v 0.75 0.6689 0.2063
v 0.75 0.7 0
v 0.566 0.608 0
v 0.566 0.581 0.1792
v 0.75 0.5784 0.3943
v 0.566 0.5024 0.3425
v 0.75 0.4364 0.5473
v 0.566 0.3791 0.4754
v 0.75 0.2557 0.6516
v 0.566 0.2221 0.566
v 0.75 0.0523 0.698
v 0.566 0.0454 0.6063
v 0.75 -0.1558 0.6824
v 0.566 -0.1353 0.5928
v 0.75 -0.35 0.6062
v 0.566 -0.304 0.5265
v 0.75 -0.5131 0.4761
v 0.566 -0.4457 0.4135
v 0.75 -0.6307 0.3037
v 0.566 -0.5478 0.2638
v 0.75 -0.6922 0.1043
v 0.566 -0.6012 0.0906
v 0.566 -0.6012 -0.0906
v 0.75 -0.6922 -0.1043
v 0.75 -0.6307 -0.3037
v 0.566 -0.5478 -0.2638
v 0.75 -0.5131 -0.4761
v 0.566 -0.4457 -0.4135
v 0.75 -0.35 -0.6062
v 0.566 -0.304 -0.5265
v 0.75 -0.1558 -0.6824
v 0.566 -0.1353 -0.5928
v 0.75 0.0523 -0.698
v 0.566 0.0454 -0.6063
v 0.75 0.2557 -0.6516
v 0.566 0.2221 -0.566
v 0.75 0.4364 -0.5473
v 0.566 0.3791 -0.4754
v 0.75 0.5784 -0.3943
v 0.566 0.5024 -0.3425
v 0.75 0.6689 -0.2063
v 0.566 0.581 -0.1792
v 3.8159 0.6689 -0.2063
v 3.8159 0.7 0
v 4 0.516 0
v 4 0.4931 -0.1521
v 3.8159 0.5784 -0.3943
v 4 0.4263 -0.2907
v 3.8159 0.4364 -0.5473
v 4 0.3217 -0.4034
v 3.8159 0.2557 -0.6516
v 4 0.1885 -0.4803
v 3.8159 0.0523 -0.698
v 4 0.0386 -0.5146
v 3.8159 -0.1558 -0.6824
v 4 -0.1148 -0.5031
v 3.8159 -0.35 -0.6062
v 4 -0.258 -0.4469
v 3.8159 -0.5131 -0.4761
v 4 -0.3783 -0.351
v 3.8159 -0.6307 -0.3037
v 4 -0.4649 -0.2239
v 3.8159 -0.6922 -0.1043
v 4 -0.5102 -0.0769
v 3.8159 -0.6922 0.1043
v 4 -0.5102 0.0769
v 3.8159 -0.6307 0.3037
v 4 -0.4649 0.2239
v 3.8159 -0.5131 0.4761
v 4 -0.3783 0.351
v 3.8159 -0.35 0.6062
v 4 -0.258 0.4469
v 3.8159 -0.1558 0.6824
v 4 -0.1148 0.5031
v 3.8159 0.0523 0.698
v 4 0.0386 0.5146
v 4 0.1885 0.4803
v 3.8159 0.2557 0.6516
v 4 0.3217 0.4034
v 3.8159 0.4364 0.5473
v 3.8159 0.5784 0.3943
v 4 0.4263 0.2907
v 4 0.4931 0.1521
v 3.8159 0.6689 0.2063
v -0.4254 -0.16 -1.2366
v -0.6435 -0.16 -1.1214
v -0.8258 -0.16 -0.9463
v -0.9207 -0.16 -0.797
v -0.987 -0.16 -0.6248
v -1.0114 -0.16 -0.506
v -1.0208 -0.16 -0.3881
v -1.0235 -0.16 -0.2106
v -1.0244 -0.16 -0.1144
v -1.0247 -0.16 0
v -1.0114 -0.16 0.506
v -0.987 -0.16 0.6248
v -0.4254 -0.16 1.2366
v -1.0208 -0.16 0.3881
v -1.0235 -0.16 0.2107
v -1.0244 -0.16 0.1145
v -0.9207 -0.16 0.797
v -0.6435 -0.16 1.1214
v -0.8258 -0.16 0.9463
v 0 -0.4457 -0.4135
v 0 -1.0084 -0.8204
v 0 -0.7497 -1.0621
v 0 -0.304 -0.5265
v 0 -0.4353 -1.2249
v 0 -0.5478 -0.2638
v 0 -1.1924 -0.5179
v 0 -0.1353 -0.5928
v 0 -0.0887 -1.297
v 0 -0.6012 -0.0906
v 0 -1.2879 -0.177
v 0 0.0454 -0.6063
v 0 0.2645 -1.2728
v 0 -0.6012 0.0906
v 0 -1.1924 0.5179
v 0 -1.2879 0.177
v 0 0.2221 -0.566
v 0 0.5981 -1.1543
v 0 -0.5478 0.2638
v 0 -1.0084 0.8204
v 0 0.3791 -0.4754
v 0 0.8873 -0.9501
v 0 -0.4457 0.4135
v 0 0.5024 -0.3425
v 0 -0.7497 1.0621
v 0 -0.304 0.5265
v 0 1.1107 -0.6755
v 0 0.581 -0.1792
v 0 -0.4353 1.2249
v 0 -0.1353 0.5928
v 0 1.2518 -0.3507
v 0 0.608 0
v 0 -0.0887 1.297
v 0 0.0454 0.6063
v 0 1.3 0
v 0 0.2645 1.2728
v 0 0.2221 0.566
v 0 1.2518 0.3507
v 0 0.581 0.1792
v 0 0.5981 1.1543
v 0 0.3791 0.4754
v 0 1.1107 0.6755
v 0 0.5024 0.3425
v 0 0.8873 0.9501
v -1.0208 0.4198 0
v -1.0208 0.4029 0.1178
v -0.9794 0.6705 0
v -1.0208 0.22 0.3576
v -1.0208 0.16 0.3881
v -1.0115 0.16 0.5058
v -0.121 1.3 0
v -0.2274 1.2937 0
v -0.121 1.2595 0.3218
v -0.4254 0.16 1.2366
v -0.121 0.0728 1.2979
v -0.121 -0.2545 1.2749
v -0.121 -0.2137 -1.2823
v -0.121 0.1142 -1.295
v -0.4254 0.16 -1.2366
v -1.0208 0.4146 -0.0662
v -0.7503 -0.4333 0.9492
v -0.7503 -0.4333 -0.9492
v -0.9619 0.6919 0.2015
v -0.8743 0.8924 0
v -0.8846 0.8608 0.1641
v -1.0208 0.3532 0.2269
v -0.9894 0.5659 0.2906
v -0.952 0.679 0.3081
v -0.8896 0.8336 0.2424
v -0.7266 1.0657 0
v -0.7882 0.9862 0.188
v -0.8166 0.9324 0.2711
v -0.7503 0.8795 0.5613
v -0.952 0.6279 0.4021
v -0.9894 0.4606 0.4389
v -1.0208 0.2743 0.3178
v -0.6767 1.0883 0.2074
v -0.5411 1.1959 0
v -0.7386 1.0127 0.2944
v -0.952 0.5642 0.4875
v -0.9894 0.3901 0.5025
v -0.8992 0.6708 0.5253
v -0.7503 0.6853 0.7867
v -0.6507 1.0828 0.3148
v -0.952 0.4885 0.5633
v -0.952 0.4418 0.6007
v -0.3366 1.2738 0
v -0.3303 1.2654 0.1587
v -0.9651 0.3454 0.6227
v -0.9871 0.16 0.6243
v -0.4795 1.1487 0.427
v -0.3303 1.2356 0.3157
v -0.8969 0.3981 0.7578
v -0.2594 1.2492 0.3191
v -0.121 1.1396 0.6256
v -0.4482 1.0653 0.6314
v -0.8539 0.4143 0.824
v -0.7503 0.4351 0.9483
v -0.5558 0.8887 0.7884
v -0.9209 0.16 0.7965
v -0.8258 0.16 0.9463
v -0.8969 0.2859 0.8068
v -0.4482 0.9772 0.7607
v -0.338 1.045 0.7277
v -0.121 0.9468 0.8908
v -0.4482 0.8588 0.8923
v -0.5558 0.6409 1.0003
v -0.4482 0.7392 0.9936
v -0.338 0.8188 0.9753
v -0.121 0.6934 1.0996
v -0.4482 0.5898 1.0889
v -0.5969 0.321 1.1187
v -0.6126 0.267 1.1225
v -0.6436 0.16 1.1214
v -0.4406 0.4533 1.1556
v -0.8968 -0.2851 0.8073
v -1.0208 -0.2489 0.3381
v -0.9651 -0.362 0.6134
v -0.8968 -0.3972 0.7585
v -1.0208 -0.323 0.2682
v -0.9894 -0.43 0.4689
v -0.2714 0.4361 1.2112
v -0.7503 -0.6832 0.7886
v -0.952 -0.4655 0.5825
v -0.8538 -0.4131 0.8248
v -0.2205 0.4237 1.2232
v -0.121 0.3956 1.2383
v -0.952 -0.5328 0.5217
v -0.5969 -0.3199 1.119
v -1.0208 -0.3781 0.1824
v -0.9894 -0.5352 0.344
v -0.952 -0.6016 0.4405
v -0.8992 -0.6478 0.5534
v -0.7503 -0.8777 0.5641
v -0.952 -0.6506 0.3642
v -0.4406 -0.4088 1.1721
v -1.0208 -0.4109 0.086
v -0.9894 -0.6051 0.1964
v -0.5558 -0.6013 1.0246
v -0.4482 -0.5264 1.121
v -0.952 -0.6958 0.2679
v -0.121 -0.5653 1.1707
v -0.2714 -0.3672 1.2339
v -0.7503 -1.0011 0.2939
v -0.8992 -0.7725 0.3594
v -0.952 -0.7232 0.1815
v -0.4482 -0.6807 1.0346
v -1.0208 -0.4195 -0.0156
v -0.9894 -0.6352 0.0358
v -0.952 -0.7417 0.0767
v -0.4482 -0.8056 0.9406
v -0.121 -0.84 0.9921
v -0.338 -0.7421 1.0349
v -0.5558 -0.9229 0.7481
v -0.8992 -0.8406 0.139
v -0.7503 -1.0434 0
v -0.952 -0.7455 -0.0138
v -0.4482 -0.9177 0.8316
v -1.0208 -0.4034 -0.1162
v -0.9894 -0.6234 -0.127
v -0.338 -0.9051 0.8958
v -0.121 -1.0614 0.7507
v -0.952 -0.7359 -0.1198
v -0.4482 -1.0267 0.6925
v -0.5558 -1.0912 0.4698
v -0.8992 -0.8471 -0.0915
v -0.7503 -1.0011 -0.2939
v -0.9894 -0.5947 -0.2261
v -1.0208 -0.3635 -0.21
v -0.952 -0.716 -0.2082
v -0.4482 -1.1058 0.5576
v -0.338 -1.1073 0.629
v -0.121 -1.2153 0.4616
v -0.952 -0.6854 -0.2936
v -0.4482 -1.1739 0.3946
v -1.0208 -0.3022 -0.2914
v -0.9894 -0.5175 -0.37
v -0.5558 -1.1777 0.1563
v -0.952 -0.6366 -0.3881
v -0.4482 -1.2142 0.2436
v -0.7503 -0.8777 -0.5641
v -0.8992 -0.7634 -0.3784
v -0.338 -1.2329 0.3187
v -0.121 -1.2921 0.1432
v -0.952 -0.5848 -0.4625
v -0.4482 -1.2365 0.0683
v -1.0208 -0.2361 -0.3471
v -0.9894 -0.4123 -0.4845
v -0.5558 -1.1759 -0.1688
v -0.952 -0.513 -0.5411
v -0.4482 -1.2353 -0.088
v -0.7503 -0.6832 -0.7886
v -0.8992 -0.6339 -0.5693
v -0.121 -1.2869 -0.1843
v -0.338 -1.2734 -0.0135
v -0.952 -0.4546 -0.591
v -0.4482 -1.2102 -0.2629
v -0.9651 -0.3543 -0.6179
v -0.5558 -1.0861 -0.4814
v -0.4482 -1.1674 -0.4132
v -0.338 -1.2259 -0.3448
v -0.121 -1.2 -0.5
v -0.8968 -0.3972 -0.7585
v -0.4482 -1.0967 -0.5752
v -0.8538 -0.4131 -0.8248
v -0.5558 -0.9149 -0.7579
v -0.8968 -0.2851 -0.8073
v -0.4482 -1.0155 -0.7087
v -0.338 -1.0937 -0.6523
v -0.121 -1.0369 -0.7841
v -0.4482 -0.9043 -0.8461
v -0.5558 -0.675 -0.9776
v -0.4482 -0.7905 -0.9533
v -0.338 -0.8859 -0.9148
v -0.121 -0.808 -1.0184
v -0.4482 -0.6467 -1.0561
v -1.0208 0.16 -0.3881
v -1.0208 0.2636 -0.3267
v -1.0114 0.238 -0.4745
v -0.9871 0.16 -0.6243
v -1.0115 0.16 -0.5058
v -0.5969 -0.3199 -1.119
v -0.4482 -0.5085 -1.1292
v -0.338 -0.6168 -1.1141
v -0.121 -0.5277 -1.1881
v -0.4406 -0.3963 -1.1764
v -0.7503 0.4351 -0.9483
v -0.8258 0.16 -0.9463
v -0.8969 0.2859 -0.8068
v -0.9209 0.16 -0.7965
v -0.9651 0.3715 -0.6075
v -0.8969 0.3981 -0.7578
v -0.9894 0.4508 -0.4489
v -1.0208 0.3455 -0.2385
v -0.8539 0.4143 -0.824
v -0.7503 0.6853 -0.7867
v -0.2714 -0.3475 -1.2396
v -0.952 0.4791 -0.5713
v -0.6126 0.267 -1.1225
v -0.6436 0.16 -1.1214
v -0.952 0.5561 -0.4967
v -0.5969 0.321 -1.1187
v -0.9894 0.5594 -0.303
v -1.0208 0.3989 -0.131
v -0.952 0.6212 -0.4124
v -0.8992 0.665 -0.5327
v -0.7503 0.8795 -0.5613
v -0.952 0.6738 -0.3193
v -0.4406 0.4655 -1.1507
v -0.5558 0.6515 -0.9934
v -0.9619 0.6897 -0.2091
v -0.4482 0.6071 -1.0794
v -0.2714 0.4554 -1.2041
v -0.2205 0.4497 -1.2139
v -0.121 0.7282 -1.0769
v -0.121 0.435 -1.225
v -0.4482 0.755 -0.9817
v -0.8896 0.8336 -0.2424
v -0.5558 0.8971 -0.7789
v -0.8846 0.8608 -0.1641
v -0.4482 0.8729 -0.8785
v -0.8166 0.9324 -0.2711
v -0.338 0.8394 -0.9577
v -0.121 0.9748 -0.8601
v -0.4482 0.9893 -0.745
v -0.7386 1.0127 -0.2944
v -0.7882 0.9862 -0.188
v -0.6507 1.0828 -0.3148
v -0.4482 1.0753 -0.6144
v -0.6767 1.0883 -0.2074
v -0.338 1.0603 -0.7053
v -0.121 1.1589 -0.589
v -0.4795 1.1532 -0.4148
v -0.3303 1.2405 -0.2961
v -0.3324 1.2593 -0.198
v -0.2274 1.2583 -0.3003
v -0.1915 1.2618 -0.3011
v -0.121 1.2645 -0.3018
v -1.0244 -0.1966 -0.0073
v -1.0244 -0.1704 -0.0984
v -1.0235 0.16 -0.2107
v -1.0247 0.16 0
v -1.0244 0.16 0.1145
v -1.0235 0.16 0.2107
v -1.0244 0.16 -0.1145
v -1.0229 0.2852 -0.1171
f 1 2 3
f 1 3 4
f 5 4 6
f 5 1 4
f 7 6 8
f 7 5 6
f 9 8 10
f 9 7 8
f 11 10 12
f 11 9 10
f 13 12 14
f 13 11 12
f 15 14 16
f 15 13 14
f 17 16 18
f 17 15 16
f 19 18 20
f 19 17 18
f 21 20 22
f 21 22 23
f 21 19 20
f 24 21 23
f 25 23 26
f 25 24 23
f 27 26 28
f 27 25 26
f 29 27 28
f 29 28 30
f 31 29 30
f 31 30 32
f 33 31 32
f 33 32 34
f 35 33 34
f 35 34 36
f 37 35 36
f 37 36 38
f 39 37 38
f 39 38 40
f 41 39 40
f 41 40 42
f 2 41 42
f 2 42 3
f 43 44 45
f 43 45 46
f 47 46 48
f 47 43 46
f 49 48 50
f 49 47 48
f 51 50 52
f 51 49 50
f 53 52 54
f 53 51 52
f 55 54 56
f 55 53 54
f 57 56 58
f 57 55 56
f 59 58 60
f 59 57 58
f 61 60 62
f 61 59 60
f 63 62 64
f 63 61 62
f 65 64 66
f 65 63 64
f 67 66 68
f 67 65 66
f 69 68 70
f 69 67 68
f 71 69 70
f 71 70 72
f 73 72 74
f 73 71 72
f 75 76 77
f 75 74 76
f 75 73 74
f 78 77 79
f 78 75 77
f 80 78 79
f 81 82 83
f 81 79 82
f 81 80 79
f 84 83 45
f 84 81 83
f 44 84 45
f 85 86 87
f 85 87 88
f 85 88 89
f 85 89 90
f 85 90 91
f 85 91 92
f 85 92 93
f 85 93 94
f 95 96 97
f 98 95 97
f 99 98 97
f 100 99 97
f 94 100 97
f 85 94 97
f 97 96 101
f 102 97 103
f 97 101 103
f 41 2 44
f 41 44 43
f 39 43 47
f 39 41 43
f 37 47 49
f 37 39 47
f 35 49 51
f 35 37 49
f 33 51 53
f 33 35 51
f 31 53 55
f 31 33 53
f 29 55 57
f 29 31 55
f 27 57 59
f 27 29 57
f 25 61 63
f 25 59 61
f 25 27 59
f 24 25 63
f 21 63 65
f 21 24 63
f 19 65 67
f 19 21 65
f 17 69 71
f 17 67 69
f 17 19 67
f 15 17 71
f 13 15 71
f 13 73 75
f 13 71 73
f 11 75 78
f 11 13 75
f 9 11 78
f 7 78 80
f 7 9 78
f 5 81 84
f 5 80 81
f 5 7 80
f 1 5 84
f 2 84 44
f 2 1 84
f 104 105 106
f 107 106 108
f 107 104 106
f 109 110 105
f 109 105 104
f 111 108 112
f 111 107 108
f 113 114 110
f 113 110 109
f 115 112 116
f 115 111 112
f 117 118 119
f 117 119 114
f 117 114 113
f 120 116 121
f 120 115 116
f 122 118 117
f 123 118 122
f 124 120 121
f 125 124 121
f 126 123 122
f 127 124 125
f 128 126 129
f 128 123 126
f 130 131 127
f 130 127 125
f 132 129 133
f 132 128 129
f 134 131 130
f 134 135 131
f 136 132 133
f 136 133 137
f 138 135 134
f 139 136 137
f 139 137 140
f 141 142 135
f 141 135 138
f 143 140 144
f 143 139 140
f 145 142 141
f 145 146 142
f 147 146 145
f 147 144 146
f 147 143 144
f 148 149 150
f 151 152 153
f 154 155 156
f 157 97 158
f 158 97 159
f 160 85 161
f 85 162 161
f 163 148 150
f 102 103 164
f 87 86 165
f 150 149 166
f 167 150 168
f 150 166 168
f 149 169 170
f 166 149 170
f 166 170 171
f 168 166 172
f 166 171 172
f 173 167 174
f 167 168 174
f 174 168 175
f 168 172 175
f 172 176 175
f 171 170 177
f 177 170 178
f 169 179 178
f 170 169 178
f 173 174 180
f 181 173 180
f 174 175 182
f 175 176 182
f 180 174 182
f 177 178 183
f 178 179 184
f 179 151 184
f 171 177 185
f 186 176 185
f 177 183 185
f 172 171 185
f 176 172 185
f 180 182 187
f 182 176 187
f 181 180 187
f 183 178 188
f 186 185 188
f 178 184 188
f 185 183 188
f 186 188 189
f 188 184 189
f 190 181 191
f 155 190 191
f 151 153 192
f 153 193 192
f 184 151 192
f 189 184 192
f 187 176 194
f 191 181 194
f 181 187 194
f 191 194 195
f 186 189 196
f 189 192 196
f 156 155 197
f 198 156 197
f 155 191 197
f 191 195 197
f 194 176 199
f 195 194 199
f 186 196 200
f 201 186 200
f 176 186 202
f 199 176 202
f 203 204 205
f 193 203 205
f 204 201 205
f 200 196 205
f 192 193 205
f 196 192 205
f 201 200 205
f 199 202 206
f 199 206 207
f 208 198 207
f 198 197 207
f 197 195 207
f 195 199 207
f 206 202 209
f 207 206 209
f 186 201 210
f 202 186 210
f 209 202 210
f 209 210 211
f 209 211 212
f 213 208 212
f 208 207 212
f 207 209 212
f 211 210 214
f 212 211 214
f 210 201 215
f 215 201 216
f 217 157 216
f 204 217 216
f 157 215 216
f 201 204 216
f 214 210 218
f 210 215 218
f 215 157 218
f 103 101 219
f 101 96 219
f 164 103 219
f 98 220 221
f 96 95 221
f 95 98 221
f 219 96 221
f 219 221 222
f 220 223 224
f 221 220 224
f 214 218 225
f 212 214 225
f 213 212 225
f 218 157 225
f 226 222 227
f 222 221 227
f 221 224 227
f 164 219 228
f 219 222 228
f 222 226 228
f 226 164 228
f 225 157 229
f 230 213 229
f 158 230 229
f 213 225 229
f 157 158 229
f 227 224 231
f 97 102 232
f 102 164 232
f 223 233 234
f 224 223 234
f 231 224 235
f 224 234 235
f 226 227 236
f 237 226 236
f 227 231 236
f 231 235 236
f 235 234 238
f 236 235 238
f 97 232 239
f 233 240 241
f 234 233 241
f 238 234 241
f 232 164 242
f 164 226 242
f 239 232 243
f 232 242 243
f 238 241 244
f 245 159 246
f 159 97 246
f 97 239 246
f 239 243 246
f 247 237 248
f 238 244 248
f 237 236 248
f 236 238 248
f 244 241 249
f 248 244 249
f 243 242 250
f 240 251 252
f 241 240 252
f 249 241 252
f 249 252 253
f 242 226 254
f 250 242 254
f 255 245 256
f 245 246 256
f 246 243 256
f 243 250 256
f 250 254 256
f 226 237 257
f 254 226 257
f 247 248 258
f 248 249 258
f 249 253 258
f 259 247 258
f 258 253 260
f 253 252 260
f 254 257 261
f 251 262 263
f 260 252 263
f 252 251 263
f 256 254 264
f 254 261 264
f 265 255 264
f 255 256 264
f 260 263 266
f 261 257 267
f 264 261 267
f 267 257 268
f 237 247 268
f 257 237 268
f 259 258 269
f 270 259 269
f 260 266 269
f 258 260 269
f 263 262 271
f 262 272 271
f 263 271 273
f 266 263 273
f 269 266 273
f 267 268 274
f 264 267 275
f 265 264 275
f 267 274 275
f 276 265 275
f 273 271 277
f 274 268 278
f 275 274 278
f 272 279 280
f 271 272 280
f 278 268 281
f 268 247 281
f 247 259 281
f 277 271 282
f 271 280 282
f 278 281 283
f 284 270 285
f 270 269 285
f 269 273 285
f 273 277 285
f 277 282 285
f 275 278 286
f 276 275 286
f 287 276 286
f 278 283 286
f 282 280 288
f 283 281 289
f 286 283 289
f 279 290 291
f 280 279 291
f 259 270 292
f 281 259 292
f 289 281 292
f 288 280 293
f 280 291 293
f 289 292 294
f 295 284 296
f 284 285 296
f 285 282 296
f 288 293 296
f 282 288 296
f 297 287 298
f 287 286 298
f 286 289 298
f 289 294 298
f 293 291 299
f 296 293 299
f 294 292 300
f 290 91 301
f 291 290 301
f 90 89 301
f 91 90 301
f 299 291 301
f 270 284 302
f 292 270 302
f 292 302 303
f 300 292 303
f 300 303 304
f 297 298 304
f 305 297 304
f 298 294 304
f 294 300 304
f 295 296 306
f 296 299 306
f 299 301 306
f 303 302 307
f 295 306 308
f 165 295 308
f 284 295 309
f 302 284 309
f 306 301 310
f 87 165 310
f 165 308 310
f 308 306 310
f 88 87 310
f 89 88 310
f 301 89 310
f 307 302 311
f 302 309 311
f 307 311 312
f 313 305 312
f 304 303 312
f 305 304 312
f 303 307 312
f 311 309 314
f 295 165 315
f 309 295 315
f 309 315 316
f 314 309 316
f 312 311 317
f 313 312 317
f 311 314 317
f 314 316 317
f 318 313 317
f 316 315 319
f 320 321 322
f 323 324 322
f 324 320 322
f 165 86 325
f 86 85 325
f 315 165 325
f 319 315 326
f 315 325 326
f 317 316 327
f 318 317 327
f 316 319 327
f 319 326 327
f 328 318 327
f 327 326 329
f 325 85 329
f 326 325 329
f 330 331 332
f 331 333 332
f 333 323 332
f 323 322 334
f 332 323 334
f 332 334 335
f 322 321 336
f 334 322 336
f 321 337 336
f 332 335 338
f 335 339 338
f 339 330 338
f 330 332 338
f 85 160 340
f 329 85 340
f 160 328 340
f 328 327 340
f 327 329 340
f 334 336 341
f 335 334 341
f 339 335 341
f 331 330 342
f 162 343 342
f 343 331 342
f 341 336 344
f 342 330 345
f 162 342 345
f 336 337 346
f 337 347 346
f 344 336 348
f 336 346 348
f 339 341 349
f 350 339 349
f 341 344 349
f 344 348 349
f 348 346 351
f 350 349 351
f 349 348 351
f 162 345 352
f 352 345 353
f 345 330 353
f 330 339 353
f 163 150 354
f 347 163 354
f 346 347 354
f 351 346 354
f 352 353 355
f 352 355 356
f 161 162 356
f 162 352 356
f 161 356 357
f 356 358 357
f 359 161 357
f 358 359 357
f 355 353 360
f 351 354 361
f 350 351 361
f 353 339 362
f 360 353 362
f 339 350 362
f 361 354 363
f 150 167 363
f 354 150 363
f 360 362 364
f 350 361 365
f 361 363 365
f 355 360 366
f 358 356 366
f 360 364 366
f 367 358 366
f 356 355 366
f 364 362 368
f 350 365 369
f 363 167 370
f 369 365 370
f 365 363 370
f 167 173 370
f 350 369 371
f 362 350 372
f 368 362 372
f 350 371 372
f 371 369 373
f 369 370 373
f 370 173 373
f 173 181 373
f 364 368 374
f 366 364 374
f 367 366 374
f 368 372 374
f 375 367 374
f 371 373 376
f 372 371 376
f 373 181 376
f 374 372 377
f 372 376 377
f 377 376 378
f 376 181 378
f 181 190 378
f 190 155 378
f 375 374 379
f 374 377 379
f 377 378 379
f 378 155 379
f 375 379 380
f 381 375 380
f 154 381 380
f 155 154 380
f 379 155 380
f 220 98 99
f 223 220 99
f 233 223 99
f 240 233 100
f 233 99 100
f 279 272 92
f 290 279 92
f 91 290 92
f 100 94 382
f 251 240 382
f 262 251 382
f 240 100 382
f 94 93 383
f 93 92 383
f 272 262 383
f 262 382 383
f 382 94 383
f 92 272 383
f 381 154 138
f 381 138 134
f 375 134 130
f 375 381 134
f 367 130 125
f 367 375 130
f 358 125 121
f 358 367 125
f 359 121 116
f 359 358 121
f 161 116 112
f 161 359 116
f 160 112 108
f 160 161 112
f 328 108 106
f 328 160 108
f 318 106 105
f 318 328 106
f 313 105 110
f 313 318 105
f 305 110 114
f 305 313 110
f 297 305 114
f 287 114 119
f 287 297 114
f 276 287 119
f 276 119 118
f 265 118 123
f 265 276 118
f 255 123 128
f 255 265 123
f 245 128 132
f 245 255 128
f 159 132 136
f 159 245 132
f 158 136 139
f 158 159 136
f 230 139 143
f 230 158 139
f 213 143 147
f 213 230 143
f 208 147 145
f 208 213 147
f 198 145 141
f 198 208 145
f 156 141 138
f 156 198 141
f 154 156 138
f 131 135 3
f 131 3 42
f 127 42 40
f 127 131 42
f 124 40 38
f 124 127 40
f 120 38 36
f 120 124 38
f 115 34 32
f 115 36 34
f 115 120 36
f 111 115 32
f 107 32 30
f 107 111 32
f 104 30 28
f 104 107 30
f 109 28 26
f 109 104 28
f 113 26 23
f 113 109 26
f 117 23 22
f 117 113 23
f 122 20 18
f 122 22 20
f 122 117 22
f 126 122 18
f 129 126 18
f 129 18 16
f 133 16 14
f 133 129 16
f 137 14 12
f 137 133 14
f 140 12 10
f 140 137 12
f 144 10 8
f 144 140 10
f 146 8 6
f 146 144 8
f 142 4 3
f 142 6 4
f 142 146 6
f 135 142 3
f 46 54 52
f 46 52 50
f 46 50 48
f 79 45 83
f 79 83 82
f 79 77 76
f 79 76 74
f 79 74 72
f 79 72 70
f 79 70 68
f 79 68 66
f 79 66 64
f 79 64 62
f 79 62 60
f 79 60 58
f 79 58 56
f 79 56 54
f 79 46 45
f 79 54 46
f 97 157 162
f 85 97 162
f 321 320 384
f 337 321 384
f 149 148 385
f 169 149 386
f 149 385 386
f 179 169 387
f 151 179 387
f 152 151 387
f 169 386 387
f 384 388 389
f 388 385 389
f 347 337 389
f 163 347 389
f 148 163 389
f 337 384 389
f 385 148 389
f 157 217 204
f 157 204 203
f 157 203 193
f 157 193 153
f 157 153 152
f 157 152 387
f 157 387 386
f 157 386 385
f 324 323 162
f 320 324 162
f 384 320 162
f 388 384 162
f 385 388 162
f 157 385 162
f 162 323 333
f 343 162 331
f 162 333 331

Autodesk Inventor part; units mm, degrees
ref_plane "YZ Plane" through (0, 0, 0) normal (1, 0, 0) x (0, 1, 0)
sketch "Sketch1" plane through (0, 0, 0) normal (0, 0, 1) x (1, 0, 0)
  line L0 (-1.0254, 0) -> (4, 0)
  line L1 (4, 0) -> (4, 0.7)
  line L2 (4, 0.7) -> (0.75, 0.7)
  line L3 (0.75, 0.7) -> (0.566, 0.608)
  line L4 (0.566, 0.608) -> (0, 0.608)
  line L5 (0, 0.608) -> (0, 1.3)
  line L6 (-4.8605, 0) -> (21.908, 0) projected
  line L7 (0, -0.26) -> (0, 1.5602) projected
  line L8 (0, 1.3) -> (-0.9811, 1.2998)
  arc A0 (-0.9811, 1.2998) -> (-1.0254, 0) centre (18.0839, 0) ccw
  dimension "d0" = 4
  dimension "d1" = 3.25
  dimension "d2" = 0.184
  dimension "d3" = 1.0254
  dimension "d4" = 1.4
  dimension "d5" = 1.216
  dimension "d9" = 2.6
  dimension "d10" = 0.01
  dimension "d15" = 19.1093
revolve "Body" add sketch "Sketch1" angle 360 about axis through (-1.0254, 0, 0) along (1, 0, 0)
fillet "Fillet1" radius 0.9 1 edges at (-0.9811, -1.2998, 0)
ref_plane "IDS_WORKPLANE{1}" through (-1.0254, 0, 0) normal (1, 0, 0) x (0, 0, -1)
sketch "Sketch2" plane through (-1.0254, 0, 0) normal (1, 0, 0) x (0, 0, -1)
  line L0 (0, -1.82) -> (0, 1.82) projected
  line L1 (1.82, 0) -> (-1.82, 0) projected
  line L2 (-1.3, 0.16) -> (1.3, 0.16)
  line L3 (1.3, 0.16) -> (1.3, -0.16)
  line L4 (1.3, -0.16) -> (-1.3, -0.16)
  line L5 (-1.3, -0.16) -> (-1.3, 0.16)
  line L6 (0, 0.16) -> (0, -0.16) construction
  line L7 (-1.3, 0) -> (1.3, 0) construction
  circle A0 centre (0, 0) radius 1.3 projected
  dimension "d17" = 0.32
extrude "Slot" cut sketch "Sketch2" along normal blind 0.6 contours L4 A0 L1 L0 | L0 L1 A0 L4 | L4 L5 A0 | A0 L3 L4 | L1 A0 L2 L0 | L0 L2 A0 L1 | L5 L2 A0 | A0 L2 L3
thread "Thread" size "M1.4x0.3" class "6g" standard "ISO Metric profile" length 3.25
chamfer "Chamfer1" distance 0.184 distance2 0.1841 1 edges at (4, -0.7, 0) measured on face at (4, 0.3353, -0.2689)
ref_plane "Work Plane2" through (8.25, 0, 0) normal (0, 0, -1) x (1, 0, 0)
equation "\"d17\" = SBR"
equation "\"d18\" = STI"
equation "\"d20\" = RR"
equation "\"d11\" = GEL"
equation "\"d13\" = -0.5 * SPD + 0.5 * GD"
equation "\"d0\" = NLG"
equation "\"d1\" = GEL"
equation "\"d2\" = GAL"
equation "\"d3\" = KOH"
equation "\"d4\" = GD"
equation "\"d5\" = BDM"
equation "\"d9\" = KOD"
equation "\"d10\" = KEWI"
equation "\"GD\" = NND"
equation "\"NLG\" = 4"
equation "\"GEL\" = 3.25"
equation "\"KOD\" = 2.6"
equation "\"KOH\" = 1.02539"
equation "\"GAL\" = 0.61345 * PTC"
equation "\"SPD\" = NND - 1.2269 * PTC"
equation "\"BDM\" = 1.216"
equation "\"GUL\" = 0.61345 * PTC"
equation "\"RR\" = 0.9"
equation "\"SBR\" = 0.32"
equation "\"STI\" = 0.6"
equation "\"KEWI\" = 0.01deg"
equation "\"KR\" = 1.6"
equation "\"d16\" = -KOH"
equation "\"PTC\" = 0.3"
equation "\"THREADDIA\" = 1.4"
equation "\"TOA\" = 30deg"
equation "\"NND\" = 1.4"
equation "\"ORI\" = 0.9"
equation "\"GD1\" = THREADDIA - 1.2269 * PTC"
properties part number "CNS 9671 - M1,4 x 4" material "Steel, Mild"
